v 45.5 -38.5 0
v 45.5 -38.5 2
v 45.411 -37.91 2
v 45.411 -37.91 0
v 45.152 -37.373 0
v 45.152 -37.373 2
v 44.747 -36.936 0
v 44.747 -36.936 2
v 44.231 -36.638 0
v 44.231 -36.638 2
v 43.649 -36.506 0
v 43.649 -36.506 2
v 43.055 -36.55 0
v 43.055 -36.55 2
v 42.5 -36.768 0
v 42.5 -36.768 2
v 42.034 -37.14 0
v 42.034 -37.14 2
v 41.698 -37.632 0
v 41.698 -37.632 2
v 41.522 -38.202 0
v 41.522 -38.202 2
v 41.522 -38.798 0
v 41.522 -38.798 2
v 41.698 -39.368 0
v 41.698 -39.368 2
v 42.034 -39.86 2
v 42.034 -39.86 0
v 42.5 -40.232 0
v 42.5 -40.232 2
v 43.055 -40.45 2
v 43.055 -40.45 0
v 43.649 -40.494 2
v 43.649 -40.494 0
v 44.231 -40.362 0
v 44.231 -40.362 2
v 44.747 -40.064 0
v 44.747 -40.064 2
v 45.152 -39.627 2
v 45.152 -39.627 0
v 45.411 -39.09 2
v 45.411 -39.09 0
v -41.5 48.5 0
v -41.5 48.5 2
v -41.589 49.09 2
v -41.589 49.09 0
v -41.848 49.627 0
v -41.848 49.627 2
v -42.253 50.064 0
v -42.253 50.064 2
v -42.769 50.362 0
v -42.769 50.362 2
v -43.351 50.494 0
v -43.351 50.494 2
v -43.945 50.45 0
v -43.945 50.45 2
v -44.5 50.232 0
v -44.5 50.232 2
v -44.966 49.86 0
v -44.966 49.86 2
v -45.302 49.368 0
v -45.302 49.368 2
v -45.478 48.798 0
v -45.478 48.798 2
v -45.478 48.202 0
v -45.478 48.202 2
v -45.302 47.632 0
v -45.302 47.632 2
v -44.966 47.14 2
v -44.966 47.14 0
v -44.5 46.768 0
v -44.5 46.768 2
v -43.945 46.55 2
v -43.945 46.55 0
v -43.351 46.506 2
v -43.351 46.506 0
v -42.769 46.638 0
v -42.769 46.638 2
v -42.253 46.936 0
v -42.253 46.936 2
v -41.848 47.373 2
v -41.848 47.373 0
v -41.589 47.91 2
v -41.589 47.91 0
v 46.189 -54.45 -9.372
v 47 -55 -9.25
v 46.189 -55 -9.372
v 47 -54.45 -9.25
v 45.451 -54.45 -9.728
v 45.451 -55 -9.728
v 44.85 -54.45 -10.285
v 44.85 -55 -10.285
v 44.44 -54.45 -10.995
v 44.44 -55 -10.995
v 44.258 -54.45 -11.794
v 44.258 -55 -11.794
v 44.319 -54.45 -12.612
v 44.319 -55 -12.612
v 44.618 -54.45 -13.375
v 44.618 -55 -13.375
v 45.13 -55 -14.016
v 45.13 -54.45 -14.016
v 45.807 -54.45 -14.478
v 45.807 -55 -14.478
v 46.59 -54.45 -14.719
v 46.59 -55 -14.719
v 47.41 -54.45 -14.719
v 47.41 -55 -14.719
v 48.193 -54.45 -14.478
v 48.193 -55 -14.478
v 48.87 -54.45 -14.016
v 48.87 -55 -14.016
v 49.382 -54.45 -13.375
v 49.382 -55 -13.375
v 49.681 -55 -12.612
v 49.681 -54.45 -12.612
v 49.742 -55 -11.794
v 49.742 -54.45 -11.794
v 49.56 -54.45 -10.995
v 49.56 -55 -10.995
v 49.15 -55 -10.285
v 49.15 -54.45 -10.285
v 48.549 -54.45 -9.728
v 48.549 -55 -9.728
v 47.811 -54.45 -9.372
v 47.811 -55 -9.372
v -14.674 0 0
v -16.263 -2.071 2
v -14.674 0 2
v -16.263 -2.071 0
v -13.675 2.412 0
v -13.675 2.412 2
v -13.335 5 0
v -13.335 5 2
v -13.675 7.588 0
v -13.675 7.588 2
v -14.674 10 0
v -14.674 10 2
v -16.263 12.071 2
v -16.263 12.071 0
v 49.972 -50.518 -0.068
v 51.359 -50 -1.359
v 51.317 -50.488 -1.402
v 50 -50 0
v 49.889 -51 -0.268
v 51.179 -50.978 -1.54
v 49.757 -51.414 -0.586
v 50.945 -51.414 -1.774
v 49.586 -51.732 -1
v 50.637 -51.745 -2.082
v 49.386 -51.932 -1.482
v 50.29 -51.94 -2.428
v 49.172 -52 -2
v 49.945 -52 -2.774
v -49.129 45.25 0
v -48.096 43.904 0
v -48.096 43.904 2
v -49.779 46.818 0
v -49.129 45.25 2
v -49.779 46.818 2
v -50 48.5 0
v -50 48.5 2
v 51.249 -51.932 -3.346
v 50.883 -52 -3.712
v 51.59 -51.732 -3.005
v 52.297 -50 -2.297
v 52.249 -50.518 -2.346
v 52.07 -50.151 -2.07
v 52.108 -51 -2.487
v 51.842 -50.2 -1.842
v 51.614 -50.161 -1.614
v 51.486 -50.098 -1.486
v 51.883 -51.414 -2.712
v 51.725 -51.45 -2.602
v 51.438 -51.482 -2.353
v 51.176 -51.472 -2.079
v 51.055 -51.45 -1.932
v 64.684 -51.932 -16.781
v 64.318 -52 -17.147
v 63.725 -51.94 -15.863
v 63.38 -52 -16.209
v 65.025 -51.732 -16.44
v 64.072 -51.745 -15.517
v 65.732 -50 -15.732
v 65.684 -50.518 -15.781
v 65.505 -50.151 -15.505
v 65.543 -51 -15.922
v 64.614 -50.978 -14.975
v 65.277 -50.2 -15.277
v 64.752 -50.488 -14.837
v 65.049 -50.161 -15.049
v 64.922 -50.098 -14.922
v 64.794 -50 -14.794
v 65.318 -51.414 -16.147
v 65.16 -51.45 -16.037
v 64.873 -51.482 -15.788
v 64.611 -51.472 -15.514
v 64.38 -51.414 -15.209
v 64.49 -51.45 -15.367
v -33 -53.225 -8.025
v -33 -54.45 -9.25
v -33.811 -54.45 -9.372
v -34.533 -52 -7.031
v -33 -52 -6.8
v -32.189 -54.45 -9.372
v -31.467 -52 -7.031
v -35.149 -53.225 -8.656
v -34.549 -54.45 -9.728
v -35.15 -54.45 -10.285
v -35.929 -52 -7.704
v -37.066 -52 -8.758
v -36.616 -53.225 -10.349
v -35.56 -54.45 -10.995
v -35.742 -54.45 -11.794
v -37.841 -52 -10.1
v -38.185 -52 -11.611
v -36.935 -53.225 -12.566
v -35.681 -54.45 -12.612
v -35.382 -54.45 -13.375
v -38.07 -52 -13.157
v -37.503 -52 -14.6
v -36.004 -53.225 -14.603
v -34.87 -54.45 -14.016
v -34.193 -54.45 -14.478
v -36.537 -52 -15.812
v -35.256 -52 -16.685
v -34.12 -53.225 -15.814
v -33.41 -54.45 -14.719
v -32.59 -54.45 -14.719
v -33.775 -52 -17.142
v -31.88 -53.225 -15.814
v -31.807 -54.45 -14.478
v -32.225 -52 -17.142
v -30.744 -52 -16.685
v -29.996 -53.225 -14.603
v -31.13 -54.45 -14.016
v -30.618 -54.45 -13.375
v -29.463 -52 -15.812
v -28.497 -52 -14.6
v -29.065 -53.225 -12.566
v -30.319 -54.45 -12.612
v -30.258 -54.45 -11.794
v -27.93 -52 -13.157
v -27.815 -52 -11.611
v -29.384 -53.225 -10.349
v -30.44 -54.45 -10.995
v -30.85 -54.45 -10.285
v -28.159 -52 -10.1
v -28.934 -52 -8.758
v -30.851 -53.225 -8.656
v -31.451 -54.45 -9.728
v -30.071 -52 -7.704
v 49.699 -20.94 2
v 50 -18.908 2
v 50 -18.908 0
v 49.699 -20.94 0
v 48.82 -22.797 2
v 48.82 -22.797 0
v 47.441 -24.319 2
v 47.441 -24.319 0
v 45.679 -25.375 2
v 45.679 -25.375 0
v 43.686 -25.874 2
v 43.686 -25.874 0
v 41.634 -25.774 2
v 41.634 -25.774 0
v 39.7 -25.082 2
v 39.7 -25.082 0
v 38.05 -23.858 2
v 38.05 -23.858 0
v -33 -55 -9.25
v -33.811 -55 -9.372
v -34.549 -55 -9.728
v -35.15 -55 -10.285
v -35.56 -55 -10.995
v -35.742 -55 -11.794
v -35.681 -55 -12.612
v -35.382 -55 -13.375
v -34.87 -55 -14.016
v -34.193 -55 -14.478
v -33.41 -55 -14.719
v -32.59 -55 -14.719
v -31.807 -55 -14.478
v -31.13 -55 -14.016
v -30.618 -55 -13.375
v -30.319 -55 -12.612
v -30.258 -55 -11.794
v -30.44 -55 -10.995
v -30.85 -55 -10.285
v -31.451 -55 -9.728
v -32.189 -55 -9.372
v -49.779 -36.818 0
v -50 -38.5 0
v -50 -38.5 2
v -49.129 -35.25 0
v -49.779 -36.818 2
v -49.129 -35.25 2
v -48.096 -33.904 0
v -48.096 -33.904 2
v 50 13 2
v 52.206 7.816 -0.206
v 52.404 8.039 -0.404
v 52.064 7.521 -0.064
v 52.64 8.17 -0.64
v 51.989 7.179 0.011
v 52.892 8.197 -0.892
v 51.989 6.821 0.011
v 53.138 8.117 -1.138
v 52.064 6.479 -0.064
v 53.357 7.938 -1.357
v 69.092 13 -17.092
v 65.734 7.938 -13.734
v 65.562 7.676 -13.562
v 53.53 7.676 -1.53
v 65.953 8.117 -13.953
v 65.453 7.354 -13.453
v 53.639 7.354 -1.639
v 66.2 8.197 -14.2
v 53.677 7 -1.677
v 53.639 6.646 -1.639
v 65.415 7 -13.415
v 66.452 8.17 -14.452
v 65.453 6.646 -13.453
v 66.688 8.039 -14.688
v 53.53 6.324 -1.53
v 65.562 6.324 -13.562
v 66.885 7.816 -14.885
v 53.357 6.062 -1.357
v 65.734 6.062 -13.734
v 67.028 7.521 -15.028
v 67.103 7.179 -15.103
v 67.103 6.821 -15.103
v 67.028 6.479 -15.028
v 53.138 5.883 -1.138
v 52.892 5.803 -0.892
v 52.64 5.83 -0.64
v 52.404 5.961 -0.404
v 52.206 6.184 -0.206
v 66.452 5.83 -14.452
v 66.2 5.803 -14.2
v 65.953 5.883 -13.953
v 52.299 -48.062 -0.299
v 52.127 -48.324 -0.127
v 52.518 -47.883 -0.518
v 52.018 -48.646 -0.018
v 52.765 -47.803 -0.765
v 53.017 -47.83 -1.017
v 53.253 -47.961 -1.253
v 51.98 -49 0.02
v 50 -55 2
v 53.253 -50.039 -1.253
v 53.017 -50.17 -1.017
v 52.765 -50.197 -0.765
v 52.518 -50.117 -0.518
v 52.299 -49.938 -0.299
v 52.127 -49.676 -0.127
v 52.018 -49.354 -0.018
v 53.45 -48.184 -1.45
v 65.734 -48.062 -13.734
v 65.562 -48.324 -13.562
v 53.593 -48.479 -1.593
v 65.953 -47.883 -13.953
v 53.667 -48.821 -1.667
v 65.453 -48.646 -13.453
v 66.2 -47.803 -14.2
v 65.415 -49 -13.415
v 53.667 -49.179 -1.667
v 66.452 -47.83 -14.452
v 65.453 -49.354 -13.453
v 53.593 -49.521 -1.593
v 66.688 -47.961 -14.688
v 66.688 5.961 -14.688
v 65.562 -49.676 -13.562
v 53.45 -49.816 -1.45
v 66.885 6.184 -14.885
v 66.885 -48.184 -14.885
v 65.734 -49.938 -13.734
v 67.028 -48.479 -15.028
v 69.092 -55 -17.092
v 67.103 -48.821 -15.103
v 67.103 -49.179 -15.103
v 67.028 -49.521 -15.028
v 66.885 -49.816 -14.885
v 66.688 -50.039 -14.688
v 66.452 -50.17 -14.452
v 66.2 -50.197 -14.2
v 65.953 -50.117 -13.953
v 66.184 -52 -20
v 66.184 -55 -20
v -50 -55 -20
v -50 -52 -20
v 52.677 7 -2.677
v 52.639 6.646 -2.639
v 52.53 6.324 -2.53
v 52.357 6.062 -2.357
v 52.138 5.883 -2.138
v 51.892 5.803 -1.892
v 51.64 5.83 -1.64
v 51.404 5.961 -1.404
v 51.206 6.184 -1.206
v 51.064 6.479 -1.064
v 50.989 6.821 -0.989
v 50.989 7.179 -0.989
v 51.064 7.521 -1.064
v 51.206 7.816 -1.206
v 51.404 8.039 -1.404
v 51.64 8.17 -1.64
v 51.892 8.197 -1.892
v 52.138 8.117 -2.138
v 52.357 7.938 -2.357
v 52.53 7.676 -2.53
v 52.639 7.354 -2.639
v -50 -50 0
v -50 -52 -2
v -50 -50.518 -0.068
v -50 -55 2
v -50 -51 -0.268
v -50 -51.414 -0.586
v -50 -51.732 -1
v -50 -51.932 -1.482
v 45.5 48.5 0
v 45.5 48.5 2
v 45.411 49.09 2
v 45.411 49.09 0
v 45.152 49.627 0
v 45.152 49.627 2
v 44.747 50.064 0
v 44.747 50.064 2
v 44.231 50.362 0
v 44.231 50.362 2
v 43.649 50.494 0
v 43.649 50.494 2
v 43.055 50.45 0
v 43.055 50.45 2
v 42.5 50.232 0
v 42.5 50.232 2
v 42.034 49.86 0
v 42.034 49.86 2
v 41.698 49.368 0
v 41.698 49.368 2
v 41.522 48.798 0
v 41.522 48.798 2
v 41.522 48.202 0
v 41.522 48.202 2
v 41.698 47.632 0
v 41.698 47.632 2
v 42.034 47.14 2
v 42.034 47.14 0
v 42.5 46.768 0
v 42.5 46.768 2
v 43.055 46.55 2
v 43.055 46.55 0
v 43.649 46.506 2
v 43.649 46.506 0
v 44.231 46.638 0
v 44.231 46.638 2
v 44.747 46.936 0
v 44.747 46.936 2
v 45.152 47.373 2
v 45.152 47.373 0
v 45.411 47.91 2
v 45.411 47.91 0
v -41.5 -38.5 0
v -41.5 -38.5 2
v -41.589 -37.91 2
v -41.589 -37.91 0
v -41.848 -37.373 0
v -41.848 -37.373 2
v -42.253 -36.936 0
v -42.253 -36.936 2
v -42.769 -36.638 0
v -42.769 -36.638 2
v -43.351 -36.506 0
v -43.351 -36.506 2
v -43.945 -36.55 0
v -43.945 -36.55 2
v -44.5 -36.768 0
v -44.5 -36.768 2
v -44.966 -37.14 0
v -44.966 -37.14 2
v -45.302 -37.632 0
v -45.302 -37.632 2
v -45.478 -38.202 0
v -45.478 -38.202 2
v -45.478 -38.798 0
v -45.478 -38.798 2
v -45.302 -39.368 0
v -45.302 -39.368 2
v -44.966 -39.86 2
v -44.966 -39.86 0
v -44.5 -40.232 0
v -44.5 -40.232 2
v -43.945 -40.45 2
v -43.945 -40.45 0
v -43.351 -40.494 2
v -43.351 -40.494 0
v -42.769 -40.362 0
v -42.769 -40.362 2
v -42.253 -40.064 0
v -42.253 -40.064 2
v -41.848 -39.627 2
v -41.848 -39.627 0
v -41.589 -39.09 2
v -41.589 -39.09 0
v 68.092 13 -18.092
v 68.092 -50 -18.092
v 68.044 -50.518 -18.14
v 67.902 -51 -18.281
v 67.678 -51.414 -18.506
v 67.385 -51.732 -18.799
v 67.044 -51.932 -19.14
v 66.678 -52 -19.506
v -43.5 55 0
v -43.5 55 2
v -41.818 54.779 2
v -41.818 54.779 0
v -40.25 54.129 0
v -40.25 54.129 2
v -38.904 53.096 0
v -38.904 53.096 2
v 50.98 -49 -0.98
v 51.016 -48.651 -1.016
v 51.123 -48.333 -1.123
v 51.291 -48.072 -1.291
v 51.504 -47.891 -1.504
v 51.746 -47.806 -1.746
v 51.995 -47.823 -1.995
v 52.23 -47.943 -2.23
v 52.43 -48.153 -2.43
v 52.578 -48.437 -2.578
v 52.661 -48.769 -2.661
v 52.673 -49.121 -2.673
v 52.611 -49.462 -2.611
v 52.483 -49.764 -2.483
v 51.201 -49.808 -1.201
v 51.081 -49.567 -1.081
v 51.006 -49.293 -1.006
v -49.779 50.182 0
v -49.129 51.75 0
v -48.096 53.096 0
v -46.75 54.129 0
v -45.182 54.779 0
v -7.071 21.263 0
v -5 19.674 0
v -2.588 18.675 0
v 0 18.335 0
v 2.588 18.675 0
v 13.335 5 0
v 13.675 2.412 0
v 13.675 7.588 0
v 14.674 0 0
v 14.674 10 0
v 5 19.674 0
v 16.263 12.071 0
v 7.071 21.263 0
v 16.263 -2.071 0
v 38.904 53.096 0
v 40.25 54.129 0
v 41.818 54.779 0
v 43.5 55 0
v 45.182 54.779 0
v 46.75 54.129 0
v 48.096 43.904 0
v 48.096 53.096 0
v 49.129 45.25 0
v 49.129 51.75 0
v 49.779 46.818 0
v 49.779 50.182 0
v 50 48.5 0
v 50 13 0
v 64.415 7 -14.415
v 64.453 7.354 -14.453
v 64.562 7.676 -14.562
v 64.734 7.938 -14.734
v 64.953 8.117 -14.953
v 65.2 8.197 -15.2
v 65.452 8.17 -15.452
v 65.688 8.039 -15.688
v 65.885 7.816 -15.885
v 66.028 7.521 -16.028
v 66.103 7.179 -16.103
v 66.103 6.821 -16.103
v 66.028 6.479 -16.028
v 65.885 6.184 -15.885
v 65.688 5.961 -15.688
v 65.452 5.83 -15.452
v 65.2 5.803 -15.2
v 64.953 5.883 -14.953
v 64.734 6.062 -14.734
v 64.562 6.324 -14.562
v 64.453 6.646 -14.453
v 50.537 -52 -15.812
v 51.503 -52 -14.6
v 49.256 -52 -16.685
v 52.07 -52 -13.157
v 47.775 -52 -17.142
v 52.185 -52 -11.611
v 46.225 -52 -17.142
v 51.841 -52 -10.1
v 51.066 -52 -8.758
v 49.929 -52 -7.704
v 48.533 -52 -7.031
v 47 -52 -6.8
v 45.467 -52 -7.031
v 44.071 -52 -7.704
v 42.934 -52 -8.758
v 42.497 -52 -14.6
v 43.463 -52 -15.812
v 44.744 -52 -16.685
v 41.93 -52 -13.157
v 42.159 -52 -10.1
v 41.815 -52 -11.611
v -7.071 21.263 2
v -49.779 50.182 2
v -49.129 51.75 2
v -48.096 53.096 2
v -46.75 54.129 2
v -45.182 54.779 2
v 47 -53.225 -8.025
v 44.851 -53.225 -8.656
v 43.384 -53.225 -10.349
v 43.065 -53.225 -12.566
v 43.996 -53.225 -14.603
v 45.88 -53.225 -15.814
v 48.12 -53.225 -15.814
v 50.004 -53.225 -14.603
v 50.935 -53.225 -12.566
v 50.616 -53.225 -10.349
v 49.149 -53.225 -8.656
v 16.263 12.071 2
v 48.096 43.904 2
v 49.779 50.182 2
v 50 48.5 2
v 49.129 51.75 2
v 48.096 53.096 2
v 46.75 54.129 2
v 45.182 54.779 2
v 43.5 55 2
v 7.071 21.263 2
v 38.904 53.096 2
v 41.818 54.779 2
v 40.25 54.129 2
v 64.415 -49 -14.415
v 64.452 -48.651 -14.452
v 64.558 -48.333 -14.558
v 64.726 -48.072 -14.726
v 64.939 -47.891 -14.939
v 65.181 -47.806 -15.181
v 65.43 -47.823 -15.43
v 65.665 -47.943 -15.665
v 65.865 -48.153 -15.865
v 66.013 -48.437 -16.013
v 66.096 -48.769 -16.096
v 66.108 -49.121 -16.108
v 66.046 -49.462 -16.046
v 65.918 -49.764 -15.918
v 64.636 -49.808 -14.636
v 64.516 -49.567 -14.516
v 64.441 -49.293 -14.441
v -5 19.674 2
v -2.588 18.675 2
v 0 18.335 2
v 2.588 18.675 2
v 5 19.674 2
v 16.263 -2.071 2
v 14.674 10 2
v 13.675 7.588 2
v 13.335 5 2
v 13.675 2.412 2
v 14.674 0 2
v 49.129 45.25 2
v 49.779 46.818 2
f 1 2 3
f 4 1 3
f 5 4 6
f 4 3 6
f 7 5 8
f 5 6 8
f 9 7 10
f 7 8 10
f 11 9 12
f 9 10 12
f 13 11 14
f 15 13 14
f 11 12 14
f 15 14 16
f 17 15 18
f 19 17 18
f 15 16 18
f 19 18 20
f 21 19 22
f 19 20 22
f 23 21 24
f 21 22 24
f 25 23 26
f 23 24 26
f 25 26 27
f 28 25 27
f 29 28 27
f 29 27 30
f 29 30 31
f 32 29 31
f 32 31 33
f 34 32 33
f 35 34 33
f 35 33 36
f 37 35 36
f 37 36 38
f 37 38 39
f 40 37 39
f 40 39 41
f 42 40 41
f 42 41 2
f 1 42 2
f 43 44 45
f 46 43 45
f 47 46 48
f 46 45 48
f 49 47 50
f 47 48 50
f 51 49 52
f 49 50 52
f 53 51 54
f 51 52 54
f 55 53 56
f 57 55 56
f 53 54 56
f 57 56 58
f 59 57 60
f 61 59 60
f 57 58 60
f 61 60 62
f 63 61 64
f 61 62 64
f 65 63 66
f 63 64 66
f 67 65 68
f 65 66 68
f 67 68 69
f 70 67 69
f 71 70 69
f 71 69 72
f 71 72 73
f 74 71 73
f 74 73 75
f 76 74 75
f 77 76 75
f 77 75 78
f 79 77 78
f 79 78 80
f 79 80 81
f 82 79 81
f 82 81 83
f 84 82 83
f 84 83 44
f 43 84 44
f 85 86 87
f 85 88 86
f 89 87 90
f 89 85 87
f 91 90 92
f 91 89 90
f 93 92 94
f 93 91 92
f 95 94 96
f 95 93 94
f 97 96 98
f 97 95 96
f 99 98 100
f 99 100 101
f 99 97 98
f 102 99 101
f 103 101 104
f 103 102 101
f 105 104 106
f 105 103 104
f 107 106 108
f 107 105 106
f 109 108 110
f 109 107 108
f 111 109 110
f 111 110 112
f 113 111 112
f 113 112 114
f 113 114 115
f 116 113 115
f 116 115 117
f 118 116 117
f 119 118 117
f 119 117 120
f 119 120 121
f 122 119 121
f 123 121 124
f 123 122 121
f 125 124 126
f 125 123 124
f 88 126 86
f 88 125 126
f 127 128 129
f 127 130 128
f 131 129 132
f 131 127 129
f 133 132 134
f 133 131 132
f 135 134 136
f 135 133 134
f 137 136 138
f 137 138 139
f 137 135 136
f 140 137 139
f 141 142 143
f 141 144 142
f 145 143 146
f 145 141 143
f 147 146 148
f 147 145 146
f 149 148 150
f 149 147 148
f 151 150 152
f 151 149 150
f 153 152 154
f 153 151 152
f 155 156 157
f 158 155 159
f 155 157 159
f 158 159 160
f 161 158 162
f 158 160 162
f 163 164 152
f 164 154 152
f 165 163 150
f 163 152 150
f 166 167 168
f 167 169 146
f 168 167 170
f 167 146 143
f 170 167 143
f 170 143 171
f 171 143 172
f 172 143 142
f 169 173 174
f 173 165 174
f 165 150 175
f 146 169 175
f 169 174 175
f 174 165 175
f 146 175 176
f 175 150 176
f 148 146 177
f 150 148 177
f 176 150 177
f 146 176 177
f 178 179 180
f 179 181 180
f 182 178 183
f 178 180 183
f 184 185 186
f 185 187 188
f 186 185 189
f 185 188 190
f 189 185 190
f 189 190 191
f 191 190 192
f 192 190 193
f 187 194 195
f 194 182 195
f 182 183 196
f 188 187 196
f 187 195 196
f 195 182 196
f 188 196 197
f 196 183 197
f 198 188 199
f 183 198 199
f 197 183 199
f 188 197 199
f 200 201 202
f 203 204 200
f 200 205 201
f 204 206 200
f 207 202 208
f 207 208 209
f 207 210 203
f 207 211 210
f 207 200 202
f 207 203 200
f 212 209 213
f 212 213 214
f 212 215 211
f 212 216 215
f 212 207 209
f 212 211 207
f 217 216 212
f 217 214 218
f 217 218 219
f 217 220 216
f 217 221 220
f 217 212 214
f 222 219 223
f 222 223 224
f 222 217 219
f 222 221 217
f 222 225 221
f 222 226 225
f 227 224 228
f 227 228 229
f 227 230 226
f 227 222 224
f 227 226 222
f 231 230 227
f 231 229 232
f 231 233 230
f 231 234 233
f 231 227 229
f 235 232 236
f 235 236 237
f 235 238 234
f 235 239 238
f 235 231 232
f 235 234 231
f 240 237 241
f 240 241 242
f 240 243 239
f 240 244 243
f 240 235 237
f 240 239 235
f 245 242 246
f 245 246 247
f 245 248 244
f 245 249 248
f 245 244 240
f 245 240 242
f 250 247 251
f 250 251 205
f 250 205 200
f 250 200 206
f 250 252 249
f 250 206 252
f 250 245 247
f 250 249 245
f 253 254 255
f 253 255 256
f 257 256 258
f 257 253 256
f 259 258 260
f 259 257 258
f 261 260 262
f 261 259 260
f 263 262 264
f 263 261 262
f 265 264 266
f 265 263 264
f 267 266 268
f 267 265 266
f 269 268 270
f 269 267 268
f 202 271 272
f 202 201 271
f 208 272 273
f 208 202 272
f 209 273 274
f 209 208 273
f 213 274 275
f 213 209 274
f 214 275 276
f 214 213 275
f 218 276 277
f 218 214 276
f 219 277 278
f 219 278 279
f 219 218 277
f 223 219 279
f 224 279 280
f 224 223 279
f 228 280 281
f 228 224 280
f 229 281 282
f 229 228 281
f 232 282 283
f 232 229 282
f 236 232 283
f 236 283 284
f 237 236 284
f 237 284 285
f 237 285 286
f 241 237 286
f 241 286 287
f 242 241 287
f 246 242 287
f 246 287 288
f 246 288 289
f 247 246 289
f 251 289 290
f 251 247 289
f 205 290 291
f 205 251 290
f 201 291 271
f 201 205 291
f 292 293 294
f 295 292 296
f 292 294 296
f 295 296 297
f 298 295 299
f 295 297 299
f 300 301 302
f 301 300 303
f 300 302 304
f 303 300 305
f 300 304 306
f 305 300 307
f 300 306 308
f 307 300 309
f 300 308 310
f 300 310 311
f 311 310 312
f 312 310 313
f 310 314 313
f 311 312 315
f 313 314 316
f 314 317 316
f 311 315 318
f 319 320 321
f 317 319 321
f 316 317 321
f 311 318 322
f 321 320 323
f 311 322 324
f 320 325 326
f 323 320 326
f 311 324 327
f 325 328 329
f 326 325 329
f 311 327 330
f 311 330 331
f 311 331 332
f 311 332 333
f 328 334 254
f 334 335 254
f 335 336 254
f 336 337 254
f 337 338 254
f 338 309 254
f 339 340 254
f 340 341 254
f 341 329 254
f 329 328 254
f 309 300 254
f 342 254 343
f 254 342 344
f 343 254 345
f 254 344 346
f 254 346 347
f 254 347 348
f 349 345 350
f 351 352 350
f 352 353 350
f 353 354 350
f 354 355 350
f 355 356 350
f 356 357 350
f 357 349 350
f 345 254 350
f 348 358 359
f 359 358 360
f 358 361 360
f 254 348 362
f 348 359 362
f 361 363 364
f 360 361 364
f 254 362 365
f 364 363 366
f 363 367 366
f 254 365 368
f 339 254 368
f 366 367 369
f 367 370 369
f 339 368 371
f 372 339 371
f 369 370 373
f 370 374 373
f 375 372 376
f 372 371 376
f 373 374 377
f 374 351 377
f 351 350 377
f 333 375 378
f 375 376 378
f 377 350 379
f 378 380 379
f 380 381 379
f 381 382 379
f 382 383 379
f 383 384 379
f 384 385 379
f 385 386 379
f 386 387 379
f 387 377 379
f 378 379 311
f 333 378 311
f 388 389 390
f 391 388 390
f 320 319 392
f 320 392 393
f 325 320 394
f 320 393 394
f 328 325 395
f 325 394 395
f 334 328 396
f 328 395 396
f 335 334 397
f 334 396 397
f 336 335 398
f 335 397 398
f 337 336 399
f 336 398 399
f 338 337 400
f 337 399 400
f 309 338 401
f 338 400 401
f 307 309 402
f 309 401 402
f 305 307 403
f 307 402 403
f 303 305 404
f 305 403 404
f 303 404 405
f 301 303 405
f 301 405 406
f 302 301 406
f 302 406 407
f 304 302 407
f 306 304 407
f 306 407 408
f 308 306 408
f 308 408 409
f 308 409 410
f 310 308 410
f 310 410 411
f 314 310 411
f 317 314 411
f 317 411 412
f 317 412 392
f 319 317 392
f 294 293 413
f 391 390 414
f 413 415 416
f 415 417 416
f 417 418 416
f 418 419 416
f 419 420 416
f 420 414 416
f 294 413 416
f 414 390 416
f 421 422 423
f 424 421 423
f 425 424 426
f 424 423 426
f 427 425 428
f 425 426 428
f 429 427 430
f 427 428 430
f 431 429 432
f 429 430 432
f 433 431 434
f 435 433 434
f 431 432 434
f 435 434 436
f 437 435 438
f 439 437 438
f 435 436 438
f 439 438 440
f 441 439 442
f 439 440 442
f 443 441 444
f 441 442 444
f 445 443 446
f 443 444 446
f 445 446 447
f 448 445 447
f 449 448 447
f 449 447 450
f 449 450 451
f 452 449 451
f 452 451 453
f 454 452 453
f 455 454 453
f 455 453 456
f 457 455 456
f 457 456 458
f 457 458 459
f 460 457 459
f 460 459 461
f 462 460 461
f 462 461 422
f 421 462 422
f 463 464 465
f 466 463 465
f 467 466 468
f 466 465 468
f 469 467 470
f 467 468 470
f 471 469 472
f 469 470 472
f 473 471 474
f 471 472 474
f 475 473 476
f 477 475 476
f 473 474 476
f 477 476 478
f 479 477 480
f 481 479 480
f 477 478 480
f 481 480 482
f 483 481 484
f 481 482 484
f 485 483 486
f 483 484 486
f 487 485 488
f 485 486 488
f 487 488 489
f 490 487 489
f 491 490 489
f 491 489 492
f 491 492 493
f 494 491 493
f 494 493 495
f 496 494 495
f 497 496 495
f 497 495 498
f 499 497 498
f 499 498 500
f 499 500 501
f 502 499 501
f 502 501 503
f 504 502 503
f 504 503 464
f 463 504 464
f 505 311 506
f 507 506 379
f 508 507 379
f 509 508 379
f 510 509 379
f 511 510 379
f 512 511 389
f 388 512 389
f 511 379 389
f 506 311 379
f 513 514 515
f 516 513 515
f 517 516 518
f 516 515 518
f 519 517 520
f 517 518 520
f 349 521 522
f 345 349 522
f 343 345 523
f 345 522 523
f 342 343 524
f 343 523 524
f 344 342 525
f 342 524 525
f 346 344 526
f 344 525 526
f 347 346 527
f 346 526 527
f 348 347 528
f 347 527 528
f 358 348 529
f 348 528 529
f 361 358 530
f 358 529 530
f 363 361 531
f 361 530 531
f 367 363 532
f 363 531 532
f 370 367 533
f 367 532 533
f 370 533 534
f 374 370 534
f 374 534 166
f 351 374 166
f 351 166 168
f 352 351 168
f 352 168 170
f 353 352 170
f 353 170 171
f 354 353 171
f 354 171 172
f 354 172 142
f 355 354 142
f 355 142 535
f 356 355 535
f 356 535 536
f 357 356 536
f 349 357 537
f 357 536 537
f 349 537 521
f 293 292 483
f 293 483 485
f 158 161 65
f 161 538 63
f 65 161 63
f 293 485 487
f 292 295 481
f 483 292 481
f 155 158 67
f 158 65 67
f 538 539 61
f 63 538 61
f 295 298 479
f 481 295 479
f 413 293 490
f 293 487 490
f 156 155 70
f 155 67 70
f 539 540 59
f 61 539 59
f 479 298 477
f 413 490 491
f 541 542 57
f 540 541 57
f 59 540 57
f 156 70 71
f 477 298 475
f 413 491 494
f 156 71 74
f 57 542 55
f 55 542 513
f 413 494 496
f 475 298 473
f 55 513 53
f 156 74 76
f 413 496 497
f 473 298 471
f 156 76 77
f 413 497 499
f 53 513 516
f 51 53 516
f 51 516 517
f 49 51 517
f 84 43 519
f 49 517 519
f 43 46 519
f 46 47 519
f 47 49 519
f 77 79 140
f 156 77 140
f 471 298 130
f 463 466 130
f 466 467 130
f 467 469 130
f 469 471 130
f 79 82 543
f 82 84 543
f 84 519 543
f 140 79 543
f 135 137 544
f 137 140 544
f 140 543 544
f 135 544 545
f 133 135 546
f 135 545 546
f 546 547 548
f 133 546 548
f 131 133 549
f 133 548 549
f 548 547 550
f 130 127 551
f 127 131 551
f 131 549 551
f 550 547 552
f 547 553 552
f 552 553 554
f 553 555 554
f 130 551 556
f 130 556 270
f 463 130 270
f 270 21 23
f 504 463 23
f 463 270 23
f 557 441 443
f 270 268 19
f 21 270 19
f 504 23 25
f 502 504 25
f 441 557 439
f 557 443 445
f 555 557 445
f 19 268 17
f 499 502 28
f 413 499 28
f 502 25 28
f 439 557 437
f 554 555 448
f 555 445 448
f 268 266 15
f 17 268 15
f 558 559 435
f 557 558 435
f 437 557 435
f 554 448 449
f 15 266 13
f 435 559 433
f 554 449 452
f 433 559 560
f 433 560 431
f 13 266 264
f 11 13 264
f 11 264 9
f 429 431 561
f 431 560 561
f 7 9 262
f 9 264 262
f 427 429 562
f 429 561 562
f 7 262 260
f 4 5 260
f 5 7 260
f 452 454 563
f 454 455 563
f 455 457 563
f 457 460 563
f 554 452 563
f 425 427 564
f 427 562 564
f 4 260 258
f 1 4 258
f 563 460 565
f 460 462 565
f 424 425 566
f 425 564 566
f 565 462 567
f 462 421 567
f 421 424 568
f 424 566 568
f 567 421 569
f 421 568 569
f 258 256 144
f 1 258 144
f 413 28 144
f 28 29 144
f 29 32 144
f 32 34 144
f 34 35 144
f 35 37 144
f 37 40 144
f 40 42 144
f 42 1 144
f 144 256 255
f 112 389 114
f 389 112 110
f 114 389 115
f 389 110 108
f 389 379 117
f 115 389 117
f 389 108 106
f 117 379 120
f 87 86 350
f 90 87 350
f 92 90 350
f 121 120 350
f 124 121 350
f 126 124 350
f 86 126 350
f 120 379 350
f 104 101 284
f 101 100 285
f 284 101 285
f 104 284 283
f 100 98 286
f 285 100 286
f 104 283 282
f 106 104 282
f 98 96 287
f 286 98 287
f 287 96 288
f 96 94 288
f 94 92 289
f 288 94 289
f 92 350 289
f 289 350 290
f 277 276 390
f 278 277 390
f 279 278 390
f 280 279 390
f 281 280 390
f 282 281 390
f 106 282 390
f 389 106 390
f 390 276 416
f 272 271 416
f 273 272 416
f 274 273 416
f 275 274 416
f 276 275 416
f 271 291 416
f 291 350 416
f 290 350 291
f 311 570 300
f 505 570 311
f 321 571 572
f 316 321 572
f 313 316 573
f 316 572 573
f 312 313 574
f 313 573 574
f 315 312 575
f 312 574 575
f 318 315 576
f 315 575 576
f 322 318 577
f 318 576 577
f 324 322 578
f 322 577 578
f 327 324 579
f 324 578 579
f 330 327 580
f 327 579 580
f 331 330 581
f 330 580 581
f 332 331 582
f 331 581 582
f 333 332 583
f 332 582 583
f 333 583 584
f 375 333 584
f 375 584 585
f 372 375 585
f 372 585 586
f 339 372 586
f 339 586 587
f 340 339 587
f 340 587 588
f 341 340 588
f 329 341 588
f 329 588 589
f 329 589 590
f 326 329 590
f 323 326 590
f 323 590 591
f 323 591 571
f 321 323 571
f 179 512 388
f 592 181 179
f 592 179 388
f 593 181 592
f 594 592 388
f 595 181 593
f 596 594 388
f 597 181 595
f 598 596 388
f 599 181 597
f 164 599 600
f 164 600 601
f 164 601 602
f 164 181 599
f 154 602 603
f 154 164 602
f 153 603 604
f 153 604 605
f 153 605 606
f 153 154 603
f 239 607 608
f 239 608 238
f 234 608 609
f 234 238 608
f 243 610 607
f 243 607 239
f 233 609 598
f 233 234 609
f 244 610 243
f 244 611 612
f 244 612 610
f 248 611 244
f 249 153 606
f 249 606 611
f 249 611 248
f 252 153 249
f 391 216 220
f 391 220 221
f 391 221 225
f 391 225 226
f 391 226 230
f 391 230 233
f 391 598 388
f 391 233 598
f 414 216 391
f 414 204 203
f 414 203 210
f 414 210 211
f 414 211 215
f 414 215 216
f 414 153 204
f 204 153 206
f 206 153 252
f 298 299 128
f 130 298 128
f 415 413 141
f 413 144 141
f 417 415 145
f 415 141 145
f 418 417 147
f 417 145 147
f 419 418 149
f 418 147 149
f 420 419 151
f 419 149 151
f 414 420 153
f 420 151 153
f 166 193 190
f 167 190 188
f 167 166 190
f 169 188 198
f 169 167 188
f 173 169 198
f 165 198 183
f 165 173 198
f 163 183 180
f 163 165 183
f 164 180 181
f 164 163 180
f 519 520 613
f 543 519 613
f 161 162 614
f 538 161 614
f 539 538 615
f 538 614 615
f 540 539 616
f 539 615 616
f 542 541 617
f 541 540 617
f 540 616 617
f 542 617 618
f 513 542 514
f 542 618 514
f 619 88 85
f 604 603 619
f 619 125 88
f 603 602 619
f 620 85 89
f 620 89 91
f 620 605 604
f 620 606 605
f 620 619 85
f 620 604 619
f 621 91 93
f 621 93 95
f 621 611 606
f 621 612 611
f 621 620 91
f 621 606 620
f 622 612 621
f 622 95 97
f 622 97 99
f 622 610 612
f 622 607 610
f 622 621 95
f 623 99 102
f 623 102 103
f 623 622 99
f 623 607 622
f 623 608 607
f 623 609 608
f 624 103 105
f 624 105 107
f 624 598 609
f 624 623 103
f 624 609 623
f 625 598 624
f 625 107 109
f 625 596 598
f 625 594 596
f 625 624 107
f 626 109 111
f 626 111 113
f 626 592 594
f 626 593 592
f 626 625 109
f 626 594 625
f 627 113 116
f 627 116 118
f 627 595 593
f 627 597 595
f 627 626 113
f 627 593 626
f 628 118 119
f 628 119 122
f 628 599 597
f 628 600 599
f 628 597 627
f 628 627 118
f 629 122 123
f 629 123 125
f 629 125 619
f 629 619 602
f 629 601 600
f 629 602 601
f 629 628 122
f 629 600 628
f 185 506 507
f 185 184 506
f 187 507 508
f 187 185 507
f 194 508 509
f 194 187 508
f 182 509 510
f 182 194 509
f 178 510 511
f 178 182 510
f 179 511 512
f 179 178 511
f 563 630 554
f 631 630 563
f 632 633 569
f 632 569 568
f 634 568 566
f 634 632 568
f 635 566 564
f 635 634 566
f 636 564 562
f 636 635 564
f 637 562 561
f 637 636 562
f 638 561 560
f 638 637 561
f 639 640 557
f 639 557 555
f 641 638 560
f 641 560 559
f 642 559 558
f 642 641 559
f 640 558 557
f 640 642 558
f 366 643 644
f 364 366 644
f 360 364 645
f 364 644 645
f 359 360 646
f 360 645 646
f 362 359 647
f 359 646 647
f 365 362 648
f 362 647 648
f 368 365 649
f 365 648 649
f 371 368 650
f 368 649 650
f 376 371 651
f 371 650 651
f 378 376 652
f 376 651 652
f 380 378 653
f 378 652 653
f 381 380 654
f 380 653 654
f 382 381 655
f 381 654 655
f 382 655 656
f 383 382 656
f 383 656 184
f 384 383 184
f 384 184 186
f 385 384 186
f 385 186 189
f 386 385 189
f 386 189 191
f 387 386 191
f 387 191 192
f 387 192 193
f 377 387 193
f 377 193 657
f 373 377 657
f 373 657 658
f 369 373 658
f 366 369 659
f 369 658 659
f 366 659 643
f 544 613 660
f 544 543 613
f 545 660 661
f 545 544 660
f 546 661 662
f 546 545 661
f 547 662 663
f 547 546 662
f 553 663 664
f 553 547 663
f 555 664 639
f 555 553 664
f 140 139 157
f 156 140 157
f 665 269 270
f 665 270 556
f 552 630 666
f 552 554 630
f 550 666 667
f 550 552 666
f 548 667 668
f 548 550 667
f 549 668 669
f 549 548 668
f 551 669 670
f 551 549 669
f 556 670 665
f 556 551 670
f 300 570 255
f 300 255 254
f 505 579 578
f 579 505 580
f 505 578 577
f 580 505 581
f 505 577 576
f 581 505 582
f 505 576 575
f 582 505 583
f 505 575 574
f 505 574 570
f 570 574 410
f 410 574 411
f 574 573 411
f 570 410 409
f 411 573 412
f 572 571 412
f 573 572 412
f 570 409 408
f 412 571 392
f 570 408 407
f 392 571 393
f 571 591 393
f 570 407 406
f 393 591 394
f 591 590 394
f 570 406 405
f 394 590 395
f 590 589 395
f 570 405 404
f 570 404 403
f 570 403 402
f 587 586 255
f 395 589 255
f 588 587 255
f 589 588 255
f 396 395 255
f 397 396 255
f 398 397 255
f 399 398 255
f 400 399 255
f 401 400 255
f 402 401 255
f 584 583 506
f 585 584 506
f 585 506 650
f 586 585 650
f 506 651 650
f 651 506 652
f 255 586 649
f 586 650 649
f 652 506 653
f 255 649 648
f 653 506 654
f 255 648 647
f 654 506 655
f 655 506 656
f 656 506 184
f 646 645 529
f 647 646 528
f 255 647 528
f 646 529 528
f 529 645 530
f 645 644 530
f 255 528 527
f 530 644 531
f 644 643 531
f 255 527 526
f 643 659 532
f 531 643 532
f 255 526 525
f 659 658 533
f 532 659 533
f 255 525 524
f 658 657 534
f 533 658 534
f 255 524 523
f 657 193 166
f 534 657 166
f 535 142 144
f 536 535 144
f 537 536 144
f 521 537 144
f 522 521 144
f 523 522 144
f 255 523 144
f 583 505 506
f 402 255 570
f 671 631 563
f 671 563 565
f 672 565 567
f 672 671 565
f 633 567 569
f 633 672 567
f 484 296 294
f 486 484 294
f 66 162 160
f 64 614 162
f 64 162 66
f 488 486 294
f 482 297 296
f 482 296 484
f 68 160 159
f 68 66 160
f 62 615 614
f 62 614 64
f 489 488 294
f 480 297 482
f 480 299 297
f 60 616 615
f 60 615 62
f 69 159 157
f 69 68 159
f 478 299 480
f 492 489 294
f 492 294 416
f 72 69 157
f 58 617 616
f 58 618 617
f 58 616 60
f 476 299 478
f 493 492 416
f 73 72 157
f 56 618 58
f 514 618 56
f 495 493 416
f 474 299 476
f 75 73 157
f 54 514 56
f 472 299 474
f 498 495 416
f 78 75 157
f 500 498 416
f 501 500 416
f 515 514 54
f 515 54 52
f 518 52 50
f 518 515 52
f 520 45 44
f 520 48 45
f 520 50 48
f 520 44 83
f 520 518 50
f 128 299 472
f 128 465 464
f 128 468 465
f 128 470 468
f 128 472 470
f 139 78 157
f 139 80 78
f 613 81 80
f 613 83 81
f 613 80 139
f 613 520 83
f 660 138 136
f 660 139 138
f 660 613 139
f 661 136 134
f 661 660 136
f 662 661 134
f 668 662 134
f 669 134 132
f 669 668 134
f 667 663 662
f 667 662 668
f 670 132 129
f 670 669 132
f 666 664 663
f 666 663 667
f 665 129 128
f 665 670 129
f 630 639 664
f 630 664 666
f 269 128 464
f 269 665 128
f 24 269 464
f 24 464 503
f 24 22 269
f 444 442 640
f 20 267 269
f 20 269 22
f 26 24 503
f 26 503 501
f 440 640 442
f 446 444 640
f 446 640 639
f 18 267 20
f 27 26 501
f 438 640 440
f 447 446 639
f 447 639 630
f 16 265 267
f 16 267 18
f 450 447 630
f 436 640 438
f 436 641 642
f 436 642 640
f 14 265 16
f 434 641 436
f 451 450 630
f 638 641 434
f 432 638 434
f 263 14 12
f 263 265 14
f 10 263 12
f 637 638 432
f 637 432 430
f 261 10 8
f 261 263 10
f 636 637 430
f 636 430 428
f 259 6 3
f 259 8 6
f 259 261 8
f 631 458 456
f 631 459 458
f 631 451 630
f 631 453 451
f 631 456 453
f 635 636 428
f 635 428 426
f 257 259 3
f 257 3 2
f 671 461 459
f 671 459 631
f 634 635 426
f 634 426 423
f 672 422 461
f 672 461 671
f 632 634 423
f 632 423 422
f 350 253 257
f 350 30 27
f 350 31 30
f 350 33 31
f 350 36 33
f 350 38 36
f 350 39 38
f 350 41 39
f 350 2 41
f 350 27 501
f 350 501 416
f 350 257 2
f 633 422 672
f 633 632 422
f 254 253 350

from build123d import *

# Parameters (mm, degrees)
ESQUISSE1_W                                 = 100
ESQUISSE1_H                                 = 110
BOSS_EXTRU_1_DEPTH                          = 2
ESQUISSE3_W                                 = 100
ESQUISSE3_H                                 = 20
BOSS_EXTRU_2_DEPTH                          = 3
ESQUISSE6_R                                 = 2
ENL_V_MAT_EXTRU_1_DEPTH                     = 78.517739905
ENL_V_MAT_EXTRU_2_DEPTH                     = 78.517739905
CONG_2_R                                    = 10
BOSS_EXTRU_3_DEPTH                          = 3
FRAISAGE_POUR_VIS_T_TE_FRAIS_E_M51_AT_COUNT = 2
FRAISAGE_POUR_VIS_T_TE_FRAIS_E_M51_AT_PITCH = 80
BOSS_EXTRU_4_DEPTH                          = 65
BOSS_EXTRU_5_DEPTH                          = 2
CONG_3_R                                    = 7
D_GAGEMENT_M21_D                            = 2.4
D_GAGEMENT_M21_ON_FACE_2_D                  = 2.4
CONG_1_R                                    = 2


with BuildPart() as part:
    # Esquisse1 → Boss.-Extru.1 (new body)
    with BuildSketch(Plane.XY):
        Rectangle(ESQUISSE1_W, ESQUISSE1_H)
    extrude(amount=BOSS_EXTRU_1_DEPTH)

    # Esquisse3 → Boss.-Extru.2 (add)
    with BuildSketch(Plane.XZ.offset(55)):
        with Locations((0, -10)):
            Rectangle(ESQUISSE3_W, ESQUISSE3_H)
    extrude(amount=-BOSS_EXTRU_2_DEPTH)

    # Esquisse6 → Enlèv. mat.-Extru.1 (cut, through all)
    with BuildSketch(Plane.XY.offset(2)):
        with Locations((-43.5, 48.5)):
            Circle(ESQUISSE6_R)
        with Locations((43.5, 48.5)):
            Circle(ESQUISSE6_R)
        with Locations((-43.5, -38.5)):
            Circle(ESQUISSE6_R)
        with Locations((43.5, -38.5)):
            Circle(ESQUISSE6_R)
    extrude(amount=-ENL_V_MAT_EXTRU_1_DEPTH, mode=Mode.SUBTRACT)

    # Esquisse7 → Enlèv. mat.-Extru.2 (cut, through all)
    with BuildSketch(Plane.XY.offset(2)):
        with BuildLine():
            Line((0, 55), (-43.500000007, 55))
            ThreePointArc((-43.500000007, 55), (-41.012557693, 54.505216963), (-38.903805922, 53.096194078))
            Line((-38.903805922, 53.096194078), (0, 14.192388155))
            Line((0, 14.192388155), (0, 55))
        make_face()
        with BuildLine():
            Line((-9.192388155, 5), (-48.096194078, 43.903805922))
            ThreePointArc((-48.096194078, 43.903805922), (-49.505216961, 46.01255769), (-50, 48.5))
            Line((-50, 48.5), (-50, -38.5))
            ThreePointArc((-50, -38.5), (-49.505216961, -36.01255769), (-48.096194078, -33.903805922))
            Line((-48.096194078, -33.903805922), (-9.192388155, 5))
        make_face()
        with BuildLine():
            Line((-50, 55), (-50, 48.5))
            ThreePointArc((-50, 48.5), (-48.09619408, 53.096194075), (-43.500000007, 55))
            Line((-43.500000007, 55), (-50, 55))
        make_face()
    enl_v_mat_extru_2 = extrude(amount=-ENL_V_MAT_EXTRU_2_DEPTH, mode=Mode.SUBTRACT)

    # Symétrie1: Enlèv. mat.-Extru.2 across plane
    add(enl_v_mat_extru_2.mirror(Plane(origin=(0, 0, 0), x_dir=(0, 0, 1), z_dir=(1, 0, 0))), mode=Mode.SUBTRACT)

    # Congé2
    cong_2_edges = [part.edges().sort_by_distance(p)[0] for p in [
        (9.192388155, 5, 1),
        (-9.192388155, 5, 1),
        (0, 14.192388155, 1),
    ]]
    fillet(cong_2_edges, radius=CONG_2_R)

    # Esquisse8 → Boss.-Extru.3 (add)
    with BuildSketch(Plane.XZ.offset(55)):
        Polygon((50, 2), (69.091883092, -17.091883092), (66.183766184, -20), (50, -20), align=None)
    extrude(amount=-BOSS_EXTRU_3_DEPTH)

    # Esquisse5 → Fraisage pour vis à tête fraisée M51 (revolve, cut)
    with BuildSketch(Plane(origin=(-33, -52, -12), x_dir=(0, 0, 1), z_dir=(1, 0, 0))):
        Polygon((0, 0), (0, 3), (2.75, 3), (2.75, 2.45), (5.2, 0), align=None)
    fraisage_pour_vis_t_te_frais_e_m51 = revolve(axis=Axis((-33, -45.65, -12), (0, -1, 0)), mode=Mode.SUBTRACT)

    # Fraisage pour vis à tête fraisée M51 at: Fraisage pour vis à tête fraisée M51 ×2
    with Locations(*[(i * FRAISAGE_POUR_VIS_T_TE_FRAIS_E_M51_AT_PITCH, 0, 0) for i in range(1, FRAISAGE_POUR_VIS_T_TE_FRAIS_E_M51_AT_COUNT)]):
        add(fraisage_pour_vis_t_te_frais_e_m51, mode=Mode.SUBTRACT)

    # Esquisse9 → Boss.-Extru.4 (add)
    with BuildSketch(Plane(origin=(0, -52, 0), x_dir=(1, 0, 0), z_dir=(0, 1, 0))):
        Polygon((50, -2), (69.091883092, 17.091883092), (68.091883092, 18.091883092), (50, 0), align=None)
    extrude(amount=BOSS_EXTRU_4_DEPTH)

    # Esquisse10 → Boss.-Extru.5 (add)
    with BuildSketch(Plane.XY.offset(2)):
        Polygon((48.096194078, -33.903805922), (50, -35.807611845), (50, -38.5), align=None)
    extrude(amount=-BOSS_EXTRU_5_DEPTH)

    # Congé3
    # the kernel refuses this fillet: 7 mm, written as the material it adds along each edge
    with BuildSketch(Plane(origin=(50, -35.807611845, 2), x_dir=(-0.707106781186548, 0.7071067811865469, 0), z_dir=(0, 0, -1))) as cong_3_piece_1_section:
        with BuildLine():
            CenterArc((CONG_3_R * 2.41421356237, CONG_3_R), CONG_3_R, 135, 135)
            Line((CONG_3_R * 1.70710678119, CONG_3_R * 1.70710678119), (0, 0))
            Line((0, 0), (CONG_3_R * 2.41421356237, 0))
        make_face()
    cong_3_piece_1 = extrude(amount=2, mode=Mode.PRIVATE)
    cong_3_piece_1 = split(cong_3_piece_1, bisect_by=Plane(origin=(49.112602223, -28.296939532, 0.887397777), z_dir=(0.7071067811865487, 0, 0.7071067811865464)), keep=Keep.TOP, mode=Mode.PRIVATE)
    cong_3_piece_1 = split(cong_3_piece_1, bisect_by=Plane(origin=(50.112602223, -28.296939532, 1.887397777), z_dir=(-0.7071067811865483, 0, -0.7071067811865467)), keep=Keep.TOP, mode=Mode.PRIVATE)
    add(cong_3_piece_1)
    with BuildSketch(Plane(origin=(50, -35.807611845, 2), x_dir=(-0.707106781186548, 0.7071067811865469, 0), z_dir=(0, 0, -1))) as cong_3_piece_2_section:
        with BuildLine():
            CenterArc((CONG_3_R * 2.41421356237, CONG_3_R), CONG_3_R, 135, 135)
            Line((CONG_3_R * 1.70710678119, CONG_3_R * 1.70710678119), (0, 0))
            Line((0, 0), (CONG_3_R * 2.41421356237, 0))
        make_face()
    cong_3_piece_2 = extrude(amount=2, mode=Mode.PRIVATE)
    cong_3_piece_2 = split(cong_3_piece_2, bisect_by=Plane(origin=(47.570771883, -28.332960354, 2.429228117), z_dir=(-0.7071067811865487, 0, -0.7071067811865464)), keep=Keep.TOP, mode=Mode.PRIVATE)
    add(cong_3_piece_2)

    # Dégagement M21 (through all)
    with Locations(Plane(origin=(52.828427125, 7, -0.828427125), x_dir=(-0.707106781187, 0, 0.707106781187), z_dir=(0.707106781187, 0, 0.707106781187))):
        with Locations((0, 0)):
            Hole(D_GAGEMENT_M21_D / 2)

    # Dégagement M21 on face 2 (through all)
    with Locations(Plane(origin=(66.263455967, 7, -14.263455967), x_dir=(0.707106781187, 0, -0.707106781187), z_dir=(0.707106781187, 0, 0.707106781187))):
        with Locations((0, 0), (0, -56), (-19, -56)):
            Hole(D_GAGEMENT_M21_ON_FACE_2_D / 2)

    # Congé1
    cong_1_edges = [part.edges().sort_by_distance(p)[0] for p in [
        (0, -52, 0),
        (59.045941546, -52, -9.045941546),
    ]]
    fillet(cong_1_edges, radius=CONG_1_R)


solid = part.part
